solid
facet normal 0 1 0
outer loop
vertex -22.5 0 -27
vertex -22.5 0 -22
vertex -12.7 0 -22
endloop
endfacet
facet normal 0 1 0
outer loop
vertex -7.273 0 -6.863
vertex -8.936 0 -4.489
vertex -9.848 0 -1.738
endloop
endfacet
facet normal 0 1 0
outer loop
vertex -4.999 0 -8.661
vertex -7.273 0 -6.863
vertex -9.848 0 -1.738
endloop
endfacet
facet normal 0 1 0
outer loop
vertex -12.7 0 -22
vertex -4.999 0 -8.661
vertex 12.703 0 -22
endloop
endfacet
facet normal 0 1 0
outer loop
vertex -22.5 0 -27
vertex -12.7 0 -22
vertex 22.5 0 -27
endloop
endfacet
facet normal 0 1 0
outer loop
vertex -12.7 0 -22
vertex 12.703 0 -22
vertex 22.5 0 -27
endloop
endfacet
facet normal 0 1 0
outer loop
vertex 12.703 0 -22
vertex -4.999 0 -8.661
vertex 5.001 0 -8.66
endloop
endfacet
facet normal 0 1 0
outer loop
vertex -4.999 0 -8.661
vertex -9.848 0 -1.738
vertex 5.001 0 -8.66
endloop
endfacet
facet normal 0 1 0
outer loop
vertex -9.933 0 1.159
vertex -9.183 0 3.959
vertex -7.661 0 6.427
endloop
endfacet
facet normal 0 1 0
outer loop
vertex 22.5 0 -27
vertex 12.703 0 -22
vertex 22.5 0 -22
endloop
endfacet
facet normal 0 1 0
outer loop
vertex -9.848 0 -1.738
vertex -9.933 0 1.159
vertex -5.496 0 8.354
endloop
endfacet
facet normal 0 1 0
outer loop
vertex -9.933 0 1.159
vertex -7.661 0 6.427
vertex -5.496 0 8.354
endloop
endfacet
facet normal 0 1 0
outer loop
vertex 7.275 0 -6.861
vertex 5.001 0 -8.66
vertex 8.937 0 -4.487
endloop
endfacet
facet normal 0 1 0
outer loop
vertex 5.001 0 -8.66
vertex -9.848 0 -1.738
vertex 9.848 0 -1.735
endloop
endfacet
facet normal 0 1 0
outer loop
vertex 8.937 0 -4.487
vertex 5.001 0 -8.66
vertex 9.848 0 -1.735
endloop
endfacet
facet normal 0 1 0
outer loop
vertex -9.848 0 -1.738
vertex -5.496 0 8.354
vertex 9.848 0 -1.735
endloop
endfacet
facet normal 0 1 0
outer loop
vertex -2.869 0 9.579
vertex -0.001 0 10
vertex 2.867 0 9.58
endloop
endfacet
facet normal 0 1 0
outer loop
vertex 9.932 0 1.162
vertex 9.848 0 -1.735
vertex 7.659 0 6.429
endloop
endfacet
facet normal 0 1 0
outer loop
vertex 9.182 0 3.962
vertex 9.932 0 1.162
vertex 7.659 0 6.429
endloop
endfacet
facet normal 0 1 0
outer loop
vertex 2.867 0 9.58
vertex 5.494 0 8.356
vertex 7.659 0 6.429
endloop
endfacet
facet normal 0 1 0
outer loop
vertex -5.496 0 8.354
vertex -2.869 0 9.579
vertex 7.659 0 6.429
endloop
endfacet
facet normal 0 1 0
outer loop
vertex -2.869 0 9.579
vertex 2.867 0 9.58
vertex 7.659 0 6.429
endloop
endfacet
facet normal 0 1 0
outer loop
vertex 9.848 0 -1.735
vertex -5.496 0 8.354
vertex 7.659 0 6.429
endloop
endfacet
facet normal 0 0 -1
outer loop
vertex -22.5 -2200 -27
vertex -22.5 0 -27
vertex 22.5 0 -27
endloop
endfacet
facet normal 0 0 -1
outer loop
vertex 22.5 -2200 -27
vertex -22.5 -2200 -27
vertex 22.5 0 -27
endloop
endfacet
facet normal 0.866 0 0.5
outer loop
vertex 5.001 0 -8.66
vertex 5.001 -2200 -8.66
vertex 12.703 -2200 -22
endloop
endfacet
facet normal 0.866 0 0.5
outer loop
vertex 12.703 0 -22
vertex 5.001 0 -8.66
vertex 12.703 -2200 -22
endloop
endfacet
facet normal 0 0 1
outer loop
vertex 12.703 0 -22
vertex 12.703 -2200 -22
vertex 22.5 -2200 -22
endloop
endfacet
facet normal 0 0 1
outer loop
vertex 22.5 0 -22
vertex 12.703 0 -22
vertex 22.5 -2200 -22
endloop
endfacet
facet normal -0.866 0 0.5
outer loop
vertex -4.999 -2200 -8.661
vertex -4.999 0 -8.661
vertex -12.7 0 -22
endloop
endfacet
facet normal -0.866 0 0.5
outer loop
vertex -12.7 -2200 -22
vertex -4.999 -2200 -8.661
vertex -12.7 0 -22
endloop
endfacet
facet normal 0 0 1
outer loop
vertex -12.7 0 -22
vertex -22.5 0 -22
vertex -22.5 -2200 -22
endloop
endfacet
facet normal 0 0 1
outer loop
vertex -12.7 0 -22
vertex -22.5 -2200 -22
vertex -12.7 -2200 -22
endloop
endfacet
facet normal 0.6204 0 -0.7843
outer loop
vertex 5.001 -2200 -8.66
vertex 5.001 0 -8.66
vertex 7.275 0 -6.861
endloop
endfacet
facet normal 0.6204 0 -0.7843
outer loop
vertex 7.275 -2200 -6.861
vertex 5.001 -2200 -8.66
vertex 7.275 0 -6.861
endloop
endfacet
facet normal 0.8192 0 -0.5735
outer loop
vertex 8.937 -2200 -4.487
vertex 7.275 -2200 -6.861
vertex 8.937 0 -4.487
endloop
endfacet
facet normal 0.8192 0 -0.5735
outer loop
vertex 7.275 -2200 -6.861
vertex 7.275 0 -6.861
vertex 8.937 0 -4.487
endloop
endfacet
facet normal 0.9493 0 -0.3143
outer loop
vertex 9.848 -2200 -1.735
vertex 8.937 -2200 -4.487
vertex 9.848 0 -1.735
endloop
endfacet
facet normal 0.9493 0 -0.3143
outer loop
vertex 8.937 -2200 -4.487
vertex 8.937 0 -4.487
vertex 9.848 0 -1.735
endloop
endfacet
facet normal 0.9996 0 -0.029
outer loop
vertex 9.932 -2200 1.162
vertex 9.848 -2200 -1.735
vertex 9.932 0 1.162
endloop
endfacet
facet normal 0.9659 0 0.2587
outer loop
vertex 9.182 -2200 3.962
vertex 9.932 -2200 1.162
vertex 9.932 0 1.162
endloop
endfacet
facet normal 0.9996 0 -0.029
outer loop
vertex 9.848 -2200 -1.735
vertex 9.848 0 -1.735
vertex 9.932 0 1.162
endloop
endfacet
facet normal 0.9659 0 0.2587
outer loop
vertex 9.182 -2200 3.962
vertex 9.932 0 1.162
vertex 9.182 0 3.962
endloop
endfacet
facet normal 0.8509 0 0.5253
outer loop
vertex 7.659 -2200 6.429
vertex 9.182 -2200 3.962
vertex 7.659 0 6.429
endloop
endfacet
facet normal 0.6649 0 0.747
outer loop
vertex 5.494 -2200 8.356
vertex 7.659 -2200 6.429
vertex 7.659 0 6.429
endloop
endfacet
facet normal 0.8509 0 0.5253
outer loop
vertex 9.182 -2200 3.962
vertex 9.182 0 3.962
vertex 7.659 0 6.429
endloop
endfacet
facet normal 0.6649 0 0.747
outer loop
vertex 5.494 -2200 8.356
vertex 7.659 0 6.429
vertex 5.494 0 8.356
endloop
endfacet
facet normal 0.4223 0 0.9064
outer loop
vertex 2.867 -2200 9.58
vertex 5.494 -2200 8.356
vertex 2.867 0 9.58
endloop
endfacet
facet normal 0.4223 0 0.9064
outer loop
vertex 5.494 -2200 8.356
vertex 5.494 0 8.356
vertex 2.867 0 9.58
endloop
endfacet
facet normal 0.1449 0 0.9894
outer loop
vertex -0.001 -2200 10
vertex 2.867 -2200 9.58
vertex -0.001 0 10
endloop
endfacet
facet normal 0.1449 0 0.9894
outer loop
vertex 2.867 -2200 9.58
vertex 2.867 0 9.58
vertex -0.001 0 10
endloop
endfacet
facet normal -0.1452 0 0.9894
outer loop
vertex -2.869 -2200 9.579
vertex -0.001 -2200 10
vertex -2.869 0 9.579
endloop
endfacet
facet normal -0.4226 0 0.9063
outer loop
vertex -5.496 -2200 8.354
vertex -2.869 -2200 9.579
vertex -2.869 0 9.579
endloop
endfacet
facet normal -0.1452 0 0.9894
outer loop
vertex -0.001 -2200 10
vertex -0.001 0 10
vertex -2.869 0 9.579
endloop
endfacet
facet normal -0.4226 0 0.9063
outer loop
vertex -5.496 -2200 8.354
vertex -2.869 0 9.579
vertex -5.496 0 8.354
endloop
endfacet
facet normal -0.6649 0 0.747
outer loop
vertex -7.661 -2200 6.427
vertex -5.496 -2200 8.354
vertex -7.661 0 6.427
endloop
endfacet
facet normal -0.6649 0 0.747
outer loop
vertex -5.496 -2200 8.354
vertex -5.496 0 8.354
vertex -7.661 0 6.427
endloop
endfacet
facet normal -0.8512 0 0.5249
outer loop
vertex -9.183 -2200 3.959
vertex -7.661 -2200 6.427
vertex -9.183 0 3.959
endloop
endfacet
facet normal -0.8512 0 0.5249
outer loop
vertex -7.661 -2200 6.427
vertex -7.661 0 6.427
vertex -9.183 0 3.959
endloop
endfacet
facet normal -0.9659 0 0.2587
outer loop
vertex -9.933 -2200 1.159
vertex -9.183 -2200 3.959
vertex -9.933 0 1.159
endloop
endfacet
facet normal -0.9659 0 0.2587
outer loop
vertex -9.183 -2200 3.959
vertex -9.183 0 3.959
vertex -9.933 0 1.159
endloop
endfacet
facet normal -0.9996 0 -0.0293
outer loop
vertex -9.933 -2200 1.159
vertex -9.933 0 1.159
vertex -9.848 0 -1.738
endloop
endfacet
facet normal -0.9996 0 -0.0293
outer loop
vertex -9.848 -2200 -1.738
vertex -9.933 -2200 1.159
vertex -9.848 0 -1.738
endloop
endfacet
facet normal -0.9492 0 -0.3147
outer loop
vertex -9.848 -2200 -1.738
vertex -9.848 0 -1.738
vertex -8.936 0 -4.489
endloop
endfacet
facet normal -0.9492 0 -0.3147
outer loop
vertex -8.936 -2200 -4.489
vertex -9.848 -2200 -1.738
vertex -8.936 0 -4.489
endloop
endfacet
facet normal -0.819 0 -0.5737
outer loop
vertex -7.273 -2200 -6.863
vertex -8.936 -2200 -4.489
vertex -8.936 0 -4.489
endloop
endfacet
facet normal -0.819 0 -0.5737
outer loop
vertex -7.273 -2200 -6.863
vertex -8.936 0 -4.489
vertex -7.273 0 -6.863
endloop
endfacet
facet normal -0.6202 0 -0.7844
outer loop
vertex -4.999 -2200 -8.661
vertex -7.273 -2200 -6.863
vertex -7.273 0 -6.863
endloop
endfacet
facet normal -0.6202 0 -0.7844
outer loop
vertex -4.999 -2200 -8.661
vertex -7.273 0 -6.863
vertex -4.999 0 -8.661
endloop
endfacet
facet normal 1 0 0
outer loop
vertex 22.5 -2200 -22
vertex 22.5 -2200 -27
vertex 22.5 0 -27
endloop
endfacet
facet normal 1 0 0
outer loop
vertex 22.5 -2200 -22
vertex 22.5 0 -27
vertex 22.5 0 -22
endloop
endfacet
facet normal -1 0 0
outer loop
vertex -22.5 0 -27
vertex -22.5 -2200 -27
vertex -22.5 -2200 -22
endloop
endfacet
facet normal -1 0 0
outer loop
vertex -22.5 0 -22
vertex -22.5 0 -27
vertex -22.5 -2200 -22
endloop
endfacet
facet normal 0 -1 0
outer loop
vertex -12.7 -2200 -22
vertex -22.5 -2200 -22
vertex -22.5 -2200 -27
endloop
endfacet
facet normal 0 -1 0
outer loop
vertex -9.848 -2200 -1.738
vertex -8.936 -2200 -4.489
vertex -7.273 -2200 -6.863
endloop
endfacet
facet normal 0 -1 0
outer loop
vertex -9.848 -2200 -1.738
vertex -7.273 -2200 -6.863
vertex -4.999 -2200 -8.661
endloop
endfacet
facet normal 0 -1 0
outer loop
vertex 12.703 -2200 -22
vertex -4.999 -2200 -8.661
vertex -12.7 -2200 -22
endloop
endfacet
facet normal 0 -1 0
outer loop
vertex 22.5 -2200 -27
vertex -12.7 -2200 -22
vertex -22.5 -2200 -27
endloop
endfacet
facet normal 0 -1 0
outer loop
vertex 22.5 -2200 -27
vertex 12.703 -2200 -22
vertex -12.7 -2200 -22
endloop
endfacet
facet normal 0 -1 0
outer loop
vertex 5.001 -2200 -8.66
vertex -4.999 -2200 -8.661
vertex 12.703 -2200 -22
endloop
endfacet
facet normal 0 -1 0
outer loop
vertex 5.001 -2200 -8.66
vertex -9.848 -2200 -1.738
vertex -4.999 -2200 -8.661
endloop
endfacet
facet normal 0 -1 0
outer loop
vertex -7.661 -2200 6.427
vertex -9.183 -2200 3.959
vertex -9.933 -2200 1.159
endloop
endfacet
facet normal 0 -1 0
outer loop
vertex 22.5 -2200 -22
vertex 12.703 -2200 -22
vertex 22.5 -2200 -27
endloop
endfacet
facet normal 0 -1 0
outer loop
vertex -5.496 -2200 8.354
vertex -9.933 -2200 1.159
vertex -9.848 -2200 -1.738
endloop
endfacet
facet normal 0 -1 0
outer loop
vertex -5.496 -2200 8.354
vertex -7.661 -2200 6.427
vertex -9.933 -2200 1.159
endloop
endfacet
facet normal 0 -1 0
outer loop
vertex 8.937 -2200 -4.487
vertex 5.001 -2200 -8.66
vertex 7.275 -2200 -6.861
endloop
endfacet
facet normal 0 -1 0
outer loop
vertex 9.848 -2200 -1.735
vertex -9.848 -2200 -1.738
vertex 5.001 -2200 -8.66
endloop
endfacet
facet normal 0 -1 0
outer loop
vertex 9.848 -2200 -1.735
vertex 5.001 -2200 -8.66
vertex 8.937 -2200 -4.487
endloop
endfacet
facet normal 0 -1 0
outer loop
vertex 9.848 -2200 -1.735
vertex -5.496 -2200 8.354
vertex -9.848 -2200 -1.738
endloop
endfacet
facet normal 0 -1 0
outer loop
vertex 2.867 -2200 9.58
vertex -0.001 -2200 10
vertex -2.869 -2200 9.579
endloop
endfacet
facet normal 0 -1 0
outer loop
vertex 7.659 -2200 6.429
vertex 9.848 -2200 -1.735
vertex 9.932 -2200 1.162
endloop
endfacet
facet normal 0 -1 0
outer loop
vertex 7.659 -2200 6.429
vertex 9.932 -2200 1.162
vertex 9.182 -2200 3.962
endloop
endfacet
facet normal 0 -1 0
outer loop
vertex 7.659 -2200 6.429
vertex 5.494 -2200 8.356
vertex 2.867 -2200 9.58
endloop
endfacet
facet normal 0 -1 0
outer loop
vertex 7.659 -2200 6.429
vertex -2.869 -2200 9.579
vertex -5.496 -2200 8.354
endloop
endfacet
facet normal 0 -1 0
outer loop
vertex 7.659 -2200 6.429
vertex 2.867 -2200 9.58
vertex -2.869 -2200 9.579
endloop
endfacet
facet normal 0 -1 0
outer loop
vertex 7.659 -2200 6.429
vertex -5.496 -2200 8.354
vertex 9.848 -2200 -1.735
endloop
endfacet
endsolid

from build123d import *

# Parameters (mm, degrees)
PAD_DEPTH = 2200


with BuildPart() as part:
    # Sketch → Pad (new body)
    with BuildSketch(Plane.XZ):
        with BuildLine():
            ThreePointArc((5.001278, -8.659516), (-0.001476, 10), (-4.998722, -8.660992))
            Line((-4.998722, -8.660992), (-12.7, -22))
            Line((-22.5, -22), (-12.7, -22))
            Line((-22.5, -27), (-22.5, -22))
            Line((-22.5, -27), (22.5, -27))
            Line((22.5, -27), (22.5, -22))
            Line((12.703402, -22), (22.5, -22))
            Line((5.001278, -8.659516), (12.703402, -22))
        make_face()
    extrude(amount=PAD_DEPTH)


solid = part.part
